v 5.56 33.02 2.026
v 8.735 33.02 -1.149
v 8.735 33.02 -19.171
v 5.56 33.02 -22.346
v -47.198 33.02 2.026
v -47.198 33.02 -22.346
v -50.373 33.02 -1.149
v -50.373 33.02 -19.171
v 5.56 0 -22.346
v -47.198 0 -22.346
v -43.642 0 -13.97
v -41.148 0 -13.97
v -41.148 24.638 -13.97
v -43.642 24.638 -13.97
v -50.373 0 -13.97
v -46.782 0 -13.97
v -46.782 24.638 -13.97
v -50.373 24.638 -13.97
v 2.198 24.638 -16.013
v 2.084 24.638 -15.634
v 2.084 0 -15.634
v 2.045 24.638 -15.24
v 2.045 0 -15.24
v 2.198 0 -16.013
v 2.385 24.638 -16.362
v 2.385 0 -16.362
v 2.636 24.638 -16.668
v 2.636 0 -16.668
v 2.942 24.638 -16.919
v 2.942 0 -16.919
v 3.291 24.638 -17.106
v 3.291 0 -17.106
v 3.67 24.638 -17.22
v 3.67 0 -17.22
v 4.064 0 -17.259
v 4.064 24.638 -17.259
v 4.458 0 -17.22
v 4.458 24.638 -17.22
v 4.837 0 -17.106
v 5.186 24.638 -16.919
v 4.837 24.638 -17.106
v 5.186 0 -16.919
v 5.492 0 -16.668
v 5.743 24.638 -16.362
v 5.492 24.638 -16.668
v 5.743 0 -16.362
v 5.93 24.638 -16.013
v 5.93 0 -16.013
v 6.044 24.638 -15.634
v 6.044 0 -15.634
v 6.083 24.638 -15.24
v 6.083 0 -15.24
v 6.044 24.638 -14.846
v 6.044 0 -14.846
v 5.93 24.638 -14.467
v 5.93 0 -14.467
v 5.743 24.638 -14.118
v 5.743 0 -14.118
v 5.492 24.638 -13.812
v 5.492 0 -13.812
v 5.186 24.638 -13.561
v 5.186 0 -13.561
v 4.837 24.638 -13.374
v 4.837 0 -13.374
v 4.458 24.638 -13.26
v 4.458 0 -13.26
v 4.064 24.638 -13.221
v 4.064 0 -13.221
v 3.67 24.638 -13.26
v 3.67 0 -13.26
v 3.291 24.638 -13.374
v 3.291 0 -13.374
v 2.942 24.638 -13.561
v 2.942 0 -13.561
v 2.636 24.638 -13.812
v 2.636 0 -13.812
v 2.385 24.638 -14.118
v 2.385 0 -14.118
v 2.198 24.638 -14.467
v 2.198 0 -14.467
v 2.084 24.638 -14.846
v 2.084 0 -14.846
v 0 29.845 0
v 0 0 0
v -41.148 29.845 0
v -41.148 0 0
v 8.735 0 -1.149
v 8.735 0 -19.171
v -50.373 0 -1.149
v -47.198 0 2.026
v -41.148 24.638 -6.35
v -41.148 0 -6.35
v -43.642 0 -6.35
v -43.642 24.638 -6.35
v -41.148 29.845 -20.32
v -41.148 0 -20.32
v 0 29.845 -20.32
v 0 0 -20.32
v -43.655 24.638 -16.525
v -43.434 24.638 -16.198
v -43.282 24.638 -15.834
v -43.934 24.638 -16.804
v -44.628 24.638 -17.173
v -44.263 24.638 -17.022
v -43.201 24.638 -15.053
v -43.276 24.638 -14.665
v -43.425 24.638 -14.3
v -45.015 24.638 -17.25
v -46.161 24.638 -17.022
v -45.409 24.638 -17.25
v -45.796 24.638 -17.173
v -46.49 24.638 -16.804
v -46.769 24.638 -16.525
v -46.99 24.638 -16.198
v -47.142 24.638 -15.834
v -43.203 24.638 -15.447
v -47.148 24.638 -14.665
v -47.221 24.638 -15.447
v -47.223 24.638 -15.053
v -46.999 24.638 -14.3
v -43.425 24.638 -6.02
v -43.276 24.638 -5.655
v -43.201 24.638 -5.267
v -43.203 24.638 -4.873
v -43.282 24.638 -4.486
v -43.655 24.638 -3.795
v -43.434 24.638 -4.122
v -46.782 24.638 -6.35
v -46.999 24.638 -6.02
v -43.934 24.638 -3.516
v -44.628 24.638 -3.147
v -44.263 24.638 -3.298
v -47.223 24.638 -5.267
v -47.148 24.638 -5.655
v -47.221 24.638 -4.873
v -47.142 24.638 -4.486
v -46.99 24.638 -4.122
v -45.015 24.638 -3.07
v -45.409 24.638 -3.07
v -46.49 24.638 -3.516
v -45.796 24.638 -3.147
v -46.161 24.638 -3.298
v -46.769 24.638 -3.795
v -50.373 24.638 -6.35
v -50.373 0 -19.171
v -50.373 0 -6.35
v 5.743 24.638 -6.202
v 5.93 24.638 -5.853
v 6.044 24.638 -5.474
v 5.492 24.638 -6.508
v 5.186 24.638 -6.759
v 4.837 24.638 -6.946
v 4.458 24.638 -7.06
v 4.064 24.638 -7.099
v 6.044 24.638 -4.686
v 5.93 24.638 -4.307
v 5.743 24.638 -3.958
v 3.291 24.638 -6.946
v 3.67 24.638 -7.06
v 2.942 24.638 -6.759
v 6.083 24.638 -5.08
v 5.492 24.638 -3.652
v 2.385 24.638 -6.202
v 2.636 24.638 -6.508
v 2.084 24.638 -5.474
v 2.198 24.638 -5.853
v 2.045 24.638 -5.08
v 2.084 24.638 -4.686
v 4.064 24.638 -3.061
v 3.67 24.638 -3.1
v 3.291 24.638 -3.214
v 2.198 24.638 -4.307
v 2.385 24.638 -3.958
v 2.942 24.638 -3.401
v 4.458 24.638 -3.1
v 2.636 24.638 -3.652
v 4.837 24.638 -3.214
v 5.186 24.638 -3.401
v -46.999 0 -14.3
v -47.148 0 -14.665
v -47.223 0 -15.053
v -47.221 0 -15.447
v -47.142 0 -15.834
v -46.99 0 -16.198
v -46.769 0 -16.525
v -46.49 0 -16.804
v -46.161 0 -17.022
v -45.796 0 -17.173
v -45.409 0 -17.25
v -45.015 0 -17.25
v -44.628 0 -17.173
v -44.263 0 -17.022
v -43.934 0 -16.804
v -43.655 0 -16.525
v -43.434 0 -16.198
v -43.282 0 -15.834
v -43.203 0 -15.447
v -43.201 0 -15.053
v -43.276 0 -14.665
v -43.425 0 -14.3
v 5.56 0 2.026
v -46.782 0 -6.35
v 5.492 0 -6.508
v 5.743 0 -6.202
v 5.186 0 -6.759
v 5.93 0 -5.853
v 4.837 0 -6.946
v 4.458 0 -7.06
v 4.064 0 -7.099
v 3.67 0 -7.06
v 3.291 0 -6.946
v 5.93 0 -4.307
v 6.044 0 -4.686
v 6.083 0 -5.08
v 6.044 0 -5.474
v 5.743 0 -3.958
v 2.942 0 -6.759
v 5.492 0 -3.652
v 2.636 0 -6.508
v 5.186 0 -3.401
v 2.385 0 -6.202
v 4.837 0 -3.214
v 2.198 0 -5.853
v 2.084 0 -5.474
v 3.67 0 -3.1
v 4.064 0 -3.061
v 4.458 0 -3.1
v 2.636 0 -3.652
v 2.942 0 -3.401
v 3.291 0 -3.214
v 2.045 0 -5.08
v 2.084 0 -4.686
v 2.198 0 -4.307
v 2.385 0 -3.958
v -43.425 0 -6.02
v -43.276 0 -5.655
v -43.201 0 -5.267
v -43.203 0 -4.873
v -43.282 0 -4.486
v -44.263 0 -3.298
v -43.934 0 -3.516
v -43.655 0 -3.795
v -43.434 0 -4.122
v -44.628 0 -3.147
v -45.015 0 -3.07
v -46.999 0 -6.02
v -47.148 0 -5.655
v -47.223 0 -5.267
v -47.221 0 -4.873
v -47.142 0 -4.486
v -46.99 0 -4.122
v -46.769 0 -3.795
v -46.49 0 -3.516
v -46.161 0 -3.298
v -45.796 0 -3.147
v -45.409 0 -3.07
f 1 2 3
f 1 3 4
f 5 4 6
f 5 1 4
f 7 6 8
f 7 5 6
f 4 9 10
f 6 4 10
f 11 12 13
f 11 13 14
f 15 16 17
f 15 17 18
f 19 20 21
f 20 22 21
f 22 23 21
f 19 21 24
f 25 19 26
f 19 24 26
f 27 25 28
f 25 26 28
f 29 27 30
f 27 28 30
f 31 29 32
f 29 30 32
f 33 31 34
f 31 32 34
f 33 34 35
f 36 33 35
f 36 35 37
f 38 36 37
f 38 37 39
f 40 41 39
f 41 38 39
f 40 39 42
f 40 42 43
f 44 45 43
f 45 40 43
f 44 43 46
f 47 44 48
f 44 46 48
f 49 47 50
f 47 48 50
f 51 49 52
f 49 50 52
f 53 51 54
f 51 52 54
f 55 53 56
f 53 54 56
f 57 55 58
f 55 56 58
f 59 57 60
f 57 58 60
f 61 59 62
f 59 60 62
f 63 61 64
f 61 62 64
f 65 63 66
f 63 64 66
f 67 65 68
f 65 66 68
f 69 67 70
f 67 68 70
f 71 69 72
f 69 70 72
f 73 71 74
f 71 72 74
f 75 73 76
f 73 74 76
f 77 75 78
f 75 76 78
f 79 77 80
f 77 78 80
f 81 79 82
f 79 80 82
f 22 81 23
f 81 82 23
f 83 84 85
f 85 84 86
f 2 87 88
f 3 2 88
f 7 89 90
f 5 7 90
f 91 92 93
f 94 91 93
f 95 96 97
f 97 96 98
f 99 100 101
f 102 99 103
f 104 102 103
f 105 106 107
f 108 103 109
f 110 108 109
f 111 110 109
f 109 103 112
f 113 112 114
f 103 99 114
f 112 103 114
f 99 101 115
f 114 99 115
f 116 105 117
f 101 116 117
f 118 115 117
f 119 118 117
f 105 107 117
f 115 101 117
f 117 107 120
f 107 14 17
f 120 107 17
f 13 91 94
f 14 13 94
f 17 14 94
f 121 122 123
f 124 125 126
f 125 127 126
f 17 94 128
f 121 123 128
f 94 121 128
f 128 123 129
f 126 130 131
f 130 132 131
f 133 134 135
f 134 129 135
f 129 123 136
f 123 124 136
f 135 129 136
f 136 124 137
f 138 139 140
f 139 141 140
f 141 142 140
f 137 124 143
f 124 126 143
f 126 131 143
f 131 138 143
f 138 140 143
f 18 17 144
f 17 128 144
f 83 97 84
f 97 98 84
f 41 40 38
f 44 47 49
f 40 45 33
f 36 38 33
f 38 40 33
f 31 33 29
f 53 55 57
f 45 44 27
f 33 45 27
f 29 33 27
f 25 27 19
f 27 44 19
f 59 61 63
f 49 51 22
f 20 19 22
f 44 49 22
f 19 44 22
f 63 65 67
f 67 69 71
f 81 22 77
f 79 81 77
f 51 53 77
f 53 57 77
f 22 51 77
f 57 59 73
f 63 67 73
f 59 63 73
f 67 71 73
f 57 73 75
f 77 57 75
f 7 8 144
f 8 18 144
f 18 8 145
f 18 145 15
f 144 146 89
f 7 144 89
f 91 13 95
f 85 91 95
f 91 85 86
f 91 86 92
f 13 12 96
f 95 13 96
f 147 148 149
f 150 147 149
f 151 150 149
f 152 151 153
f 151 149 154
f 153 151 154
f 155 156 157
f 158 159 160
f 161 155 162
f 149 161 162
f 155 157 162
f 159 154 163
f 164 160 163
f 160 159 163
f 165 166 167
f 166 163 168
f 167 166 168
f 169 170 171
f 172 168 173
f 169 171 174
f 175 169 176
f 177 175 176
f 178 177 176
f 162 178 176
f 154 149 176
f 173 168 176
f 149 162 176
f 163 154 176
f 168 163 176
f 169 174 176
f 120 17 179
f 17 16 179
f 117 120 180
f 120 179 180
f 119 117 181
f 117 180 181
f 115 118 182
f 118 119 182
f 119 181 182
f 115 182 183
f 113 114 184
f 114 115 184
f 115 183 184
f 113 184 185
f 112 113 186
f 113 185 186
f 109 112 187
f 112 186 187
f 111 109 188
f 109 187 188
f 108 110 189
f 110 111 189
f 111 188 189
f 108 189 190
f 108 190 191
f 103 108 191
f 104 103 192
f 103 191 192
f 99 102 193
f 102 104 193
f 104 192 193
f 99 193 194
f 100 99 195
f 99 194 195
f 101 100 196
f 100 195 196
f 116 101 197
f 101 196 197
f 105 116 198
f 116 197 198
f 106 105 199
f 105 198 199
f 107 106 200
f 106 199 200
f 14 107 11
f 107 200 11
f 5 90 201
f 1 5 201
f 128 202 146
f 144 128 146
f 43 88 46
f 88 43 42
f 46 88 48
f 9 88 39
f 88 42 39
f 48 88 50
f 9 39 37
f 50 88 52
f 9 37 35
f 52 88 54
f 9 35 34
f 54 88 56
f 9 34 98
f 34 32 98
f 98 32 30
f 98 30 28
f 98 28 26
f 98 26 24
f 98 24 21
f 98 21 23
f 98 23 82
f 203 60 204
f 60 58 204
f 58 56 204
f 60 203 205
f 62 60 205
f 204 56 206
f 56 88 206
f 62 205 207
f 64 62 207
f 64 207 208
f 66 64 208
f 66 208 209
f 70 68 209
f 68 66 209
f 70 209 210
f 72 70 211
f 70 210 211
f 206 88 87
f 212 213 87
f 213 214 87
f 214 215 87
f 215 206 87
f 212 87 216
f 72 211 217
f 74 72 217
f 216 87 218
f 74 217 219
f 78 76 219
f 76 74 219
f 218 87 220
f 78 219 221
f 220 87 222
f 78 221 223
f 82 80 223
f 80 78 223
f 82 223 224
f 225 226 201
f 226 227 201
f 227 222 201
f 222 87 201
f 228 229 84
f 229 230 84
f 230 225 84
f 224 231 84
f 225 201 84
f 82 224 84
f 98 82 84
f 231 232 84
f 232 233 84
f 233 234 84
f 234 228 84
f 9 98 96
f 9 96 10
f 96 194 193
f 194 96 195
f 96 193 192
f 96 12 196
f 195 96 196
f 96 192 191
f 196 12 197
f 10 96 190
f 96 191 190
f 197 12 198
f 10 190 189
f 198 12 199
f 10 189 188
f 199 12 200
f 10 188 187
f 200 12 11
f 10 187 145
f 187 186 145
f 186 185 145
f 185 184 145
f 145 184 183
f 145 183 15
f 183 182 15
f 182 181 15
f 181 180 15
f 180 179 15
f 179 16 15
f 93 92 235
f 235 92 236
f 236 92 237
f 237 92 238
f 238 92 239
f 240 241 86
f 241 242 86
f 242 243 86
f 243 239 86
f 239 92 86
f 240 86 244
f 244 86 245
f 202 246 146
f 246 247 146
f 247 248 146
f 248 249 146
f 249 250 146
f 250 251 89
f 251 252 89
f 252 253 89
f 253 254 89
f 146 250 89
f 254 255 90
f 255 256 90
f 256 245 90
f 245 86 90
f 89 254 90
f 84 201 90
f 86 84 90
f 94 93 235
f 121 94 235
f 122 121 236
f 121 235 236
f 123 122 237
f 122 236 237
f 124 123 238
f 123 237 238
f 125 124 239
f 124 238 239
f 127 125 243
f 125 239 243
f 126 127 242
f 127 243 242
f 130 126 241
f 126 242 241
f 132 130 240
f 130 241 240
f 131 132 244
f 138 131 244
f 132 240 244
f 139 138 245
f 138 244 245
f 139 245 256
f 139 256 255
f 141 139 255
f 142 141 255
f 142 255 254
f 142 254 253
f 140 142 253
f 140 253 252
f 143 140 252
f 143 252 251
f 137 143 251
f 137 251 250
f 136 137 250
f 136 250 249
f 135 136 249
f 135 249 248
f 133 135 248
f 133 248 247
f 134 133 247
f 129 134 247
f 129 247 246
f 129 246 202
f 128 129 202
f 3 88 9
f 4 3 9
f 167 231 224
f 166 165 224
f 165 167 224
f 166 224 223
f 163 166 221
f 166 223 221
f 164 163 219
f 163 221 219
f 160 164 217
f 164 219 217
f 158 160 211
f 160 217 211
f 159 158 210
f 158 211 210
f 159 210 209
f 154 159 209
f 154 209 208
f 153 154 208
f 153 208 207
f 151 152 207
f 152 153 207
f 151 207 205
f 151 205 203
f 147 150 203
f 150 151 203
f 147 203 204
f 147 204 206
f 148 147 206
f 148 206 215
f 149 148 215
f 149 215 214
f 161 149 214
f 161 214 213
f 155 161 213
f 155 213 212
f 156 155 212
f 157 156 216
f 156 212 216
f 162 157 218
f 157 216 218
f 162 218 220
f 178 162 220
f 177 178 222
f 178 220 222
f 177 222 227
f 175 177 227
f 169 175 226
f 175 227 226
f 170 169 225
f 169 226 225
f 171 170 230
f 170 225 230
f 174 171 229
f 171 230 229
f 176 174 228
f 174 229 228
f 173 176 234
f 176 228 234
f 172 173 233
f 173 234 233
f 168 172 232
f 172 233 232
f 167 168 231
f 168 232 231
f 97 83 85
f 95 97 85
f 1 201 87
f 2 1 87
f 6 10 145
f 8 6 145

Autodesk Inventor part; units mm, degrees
ref_plane "YZ Plane" through (0, 0, 0) normal (1, 0, 0) x (0, 1, 0)
ref_plane "XZ Plane" through (0, 0, 0) normal (0, 1, 0) x (-1, 0, 0)
ref_plane "XY Plane" through (0, 0, 0) normal (0, 0, 1) x (1, 0, 0)
sketch "Sketch1" plane through (0, 0, 0) normal (0, 1, 0) x (-1, 0, 0)
  line L0 (0, 0) -> (41.148, 0)
  line L1 (41.148, 0) -> (41.148, -20.32)
  line L2 (41.148, -20.32) -> (0, -20.32)
  line L3 (0, -20.32) -> (0, 0)
  line L4 (47.498, 2.0259) -> (-5.588, 2.0259)
  line L5 (-5.588, -22.3459) -> (47.1979, -22.3459)
  circle A0 centre (45.212, -15.24) radius 2.0193
  circle A1 centre (-4.064, -15.24) radius 2.0193
  line L6 (41.148, -10.16) -> (50.3729, -10.16)
  line L7 (41.148, -13.97) -> (50.3729, -13.97)
  line L8 (41.148, -6.35) -> (50.3729, -6.35)
  line L9 (0, -10.16) -> (-8.7354, -10.16)
  line L10 (-5.588, 2.0259) -> (-5.5604, 2.0259)
  line L11 (-8.7354, -1.1491) -> (-8.7354, -19.1709)
  line L12 (-5.5604, -22.3459) -> (-5.588, -22.3459)
  line L13 (47.498, -22.3459) -> (47.1979, -22.3459)
  line L14 (50.3729, -19.1709) -> (50.3729, -1.1491)
  line L15 (47.1979, 2.0259) -> (47.498, 2.0259)
  circle A2 centre (45.212, -5.08) radius 2.0193
  circle A3 centre (-4.064, -5.08) radius 2.0193
  line L16 (-5.5604, 2.0259) -> (-8.7354, -1.1491)
  line L17 (-8.7354, -19.1709) -> (-5.5604, -22.3459)
  line L18 (47.1979, -22.3459) -> (50.3729, -19.1709)
  line L19 (50.3729, -1.1491) -> (47.1979, 2.0259)
  point P0 (41.148, -6.35)
  point P1 (41.148, -13.97)
  point P2 (-8.7354, 2.0259)
  point P3 (-8.7354, -22.3459)
  point P4 (50.3729, -22.3459)
  point P5 (50.3729, 2.0259)
  point P6 (46.7819, -6.35)
  point P7 (43.6421, -6.35)
  point P8 (43.6421, -13.97)
  point P9 (46.7819, -13.97)
  dimension "d0" = 41.148
  dimension "d1" = 20.32
  dimension "d4" = 4.0386
  dimension "d5" = 4.0386
  dimension "d6" = 3.81
  dimension "d7" = 3.81
  dimension "d16" = 5.08
  dimension "d17" = 5.08
  dimension "d18" = 4.064
  dimension "d19" = 4.064
  dimension "d20" = 3.175
  dimension "d21" = 3.175
  dimension "d22" = 3.175
  dimension "d23" = 3.175
  dimension "d24" = 3.175
  dimension "d25" = 3.175
  dimension "d26" = 3.175
  dimension "d27" = 3.175
extrude "Extrusion1" add sketch "Sketch1" along normal blind 33.02 contours L3 L9 L11 L16 L4 L19 L14 L8 A2 L1 L0 | L0 L1 L2 L3 | L3 L2 L1 L7 A0 L14 L18 L5 L17 L11 L9 | L8 A2 L14 L6 L1 | L6 L14 L7 A0 L1 | A2 L8 | L8 A2 | L7 A0 | A0 L7 | A1 | A3
extrude "Extrusion2" cut sketch "Sketch1" along normal blind 24.638 contours L7 A0 | A0 L7 | A1
extrude "Extrusion3" cut sketch "Sketch1" along normal blind 29.845 contours L0 L1 L2 L3
extrude "Extrusion4" cut sketch "Sketch1" along normal up to surface (24.638 mm away) contours L8 A2 L14 L6 L1 | L6 L14 L7 A0 L1 | A2 L8 | L8 A2 | A3
equation "\"d21\" = d20"
equation "\"d22\" = d20"
equation "\"d23\" = d22"
equation "\"d24\" = d20"
equation "\"d25\" = d24"
equation "\"d26\" = d20"
equation "\"d27\" = d26"
properties part number "Servo Mount and Screw Hole Test"
